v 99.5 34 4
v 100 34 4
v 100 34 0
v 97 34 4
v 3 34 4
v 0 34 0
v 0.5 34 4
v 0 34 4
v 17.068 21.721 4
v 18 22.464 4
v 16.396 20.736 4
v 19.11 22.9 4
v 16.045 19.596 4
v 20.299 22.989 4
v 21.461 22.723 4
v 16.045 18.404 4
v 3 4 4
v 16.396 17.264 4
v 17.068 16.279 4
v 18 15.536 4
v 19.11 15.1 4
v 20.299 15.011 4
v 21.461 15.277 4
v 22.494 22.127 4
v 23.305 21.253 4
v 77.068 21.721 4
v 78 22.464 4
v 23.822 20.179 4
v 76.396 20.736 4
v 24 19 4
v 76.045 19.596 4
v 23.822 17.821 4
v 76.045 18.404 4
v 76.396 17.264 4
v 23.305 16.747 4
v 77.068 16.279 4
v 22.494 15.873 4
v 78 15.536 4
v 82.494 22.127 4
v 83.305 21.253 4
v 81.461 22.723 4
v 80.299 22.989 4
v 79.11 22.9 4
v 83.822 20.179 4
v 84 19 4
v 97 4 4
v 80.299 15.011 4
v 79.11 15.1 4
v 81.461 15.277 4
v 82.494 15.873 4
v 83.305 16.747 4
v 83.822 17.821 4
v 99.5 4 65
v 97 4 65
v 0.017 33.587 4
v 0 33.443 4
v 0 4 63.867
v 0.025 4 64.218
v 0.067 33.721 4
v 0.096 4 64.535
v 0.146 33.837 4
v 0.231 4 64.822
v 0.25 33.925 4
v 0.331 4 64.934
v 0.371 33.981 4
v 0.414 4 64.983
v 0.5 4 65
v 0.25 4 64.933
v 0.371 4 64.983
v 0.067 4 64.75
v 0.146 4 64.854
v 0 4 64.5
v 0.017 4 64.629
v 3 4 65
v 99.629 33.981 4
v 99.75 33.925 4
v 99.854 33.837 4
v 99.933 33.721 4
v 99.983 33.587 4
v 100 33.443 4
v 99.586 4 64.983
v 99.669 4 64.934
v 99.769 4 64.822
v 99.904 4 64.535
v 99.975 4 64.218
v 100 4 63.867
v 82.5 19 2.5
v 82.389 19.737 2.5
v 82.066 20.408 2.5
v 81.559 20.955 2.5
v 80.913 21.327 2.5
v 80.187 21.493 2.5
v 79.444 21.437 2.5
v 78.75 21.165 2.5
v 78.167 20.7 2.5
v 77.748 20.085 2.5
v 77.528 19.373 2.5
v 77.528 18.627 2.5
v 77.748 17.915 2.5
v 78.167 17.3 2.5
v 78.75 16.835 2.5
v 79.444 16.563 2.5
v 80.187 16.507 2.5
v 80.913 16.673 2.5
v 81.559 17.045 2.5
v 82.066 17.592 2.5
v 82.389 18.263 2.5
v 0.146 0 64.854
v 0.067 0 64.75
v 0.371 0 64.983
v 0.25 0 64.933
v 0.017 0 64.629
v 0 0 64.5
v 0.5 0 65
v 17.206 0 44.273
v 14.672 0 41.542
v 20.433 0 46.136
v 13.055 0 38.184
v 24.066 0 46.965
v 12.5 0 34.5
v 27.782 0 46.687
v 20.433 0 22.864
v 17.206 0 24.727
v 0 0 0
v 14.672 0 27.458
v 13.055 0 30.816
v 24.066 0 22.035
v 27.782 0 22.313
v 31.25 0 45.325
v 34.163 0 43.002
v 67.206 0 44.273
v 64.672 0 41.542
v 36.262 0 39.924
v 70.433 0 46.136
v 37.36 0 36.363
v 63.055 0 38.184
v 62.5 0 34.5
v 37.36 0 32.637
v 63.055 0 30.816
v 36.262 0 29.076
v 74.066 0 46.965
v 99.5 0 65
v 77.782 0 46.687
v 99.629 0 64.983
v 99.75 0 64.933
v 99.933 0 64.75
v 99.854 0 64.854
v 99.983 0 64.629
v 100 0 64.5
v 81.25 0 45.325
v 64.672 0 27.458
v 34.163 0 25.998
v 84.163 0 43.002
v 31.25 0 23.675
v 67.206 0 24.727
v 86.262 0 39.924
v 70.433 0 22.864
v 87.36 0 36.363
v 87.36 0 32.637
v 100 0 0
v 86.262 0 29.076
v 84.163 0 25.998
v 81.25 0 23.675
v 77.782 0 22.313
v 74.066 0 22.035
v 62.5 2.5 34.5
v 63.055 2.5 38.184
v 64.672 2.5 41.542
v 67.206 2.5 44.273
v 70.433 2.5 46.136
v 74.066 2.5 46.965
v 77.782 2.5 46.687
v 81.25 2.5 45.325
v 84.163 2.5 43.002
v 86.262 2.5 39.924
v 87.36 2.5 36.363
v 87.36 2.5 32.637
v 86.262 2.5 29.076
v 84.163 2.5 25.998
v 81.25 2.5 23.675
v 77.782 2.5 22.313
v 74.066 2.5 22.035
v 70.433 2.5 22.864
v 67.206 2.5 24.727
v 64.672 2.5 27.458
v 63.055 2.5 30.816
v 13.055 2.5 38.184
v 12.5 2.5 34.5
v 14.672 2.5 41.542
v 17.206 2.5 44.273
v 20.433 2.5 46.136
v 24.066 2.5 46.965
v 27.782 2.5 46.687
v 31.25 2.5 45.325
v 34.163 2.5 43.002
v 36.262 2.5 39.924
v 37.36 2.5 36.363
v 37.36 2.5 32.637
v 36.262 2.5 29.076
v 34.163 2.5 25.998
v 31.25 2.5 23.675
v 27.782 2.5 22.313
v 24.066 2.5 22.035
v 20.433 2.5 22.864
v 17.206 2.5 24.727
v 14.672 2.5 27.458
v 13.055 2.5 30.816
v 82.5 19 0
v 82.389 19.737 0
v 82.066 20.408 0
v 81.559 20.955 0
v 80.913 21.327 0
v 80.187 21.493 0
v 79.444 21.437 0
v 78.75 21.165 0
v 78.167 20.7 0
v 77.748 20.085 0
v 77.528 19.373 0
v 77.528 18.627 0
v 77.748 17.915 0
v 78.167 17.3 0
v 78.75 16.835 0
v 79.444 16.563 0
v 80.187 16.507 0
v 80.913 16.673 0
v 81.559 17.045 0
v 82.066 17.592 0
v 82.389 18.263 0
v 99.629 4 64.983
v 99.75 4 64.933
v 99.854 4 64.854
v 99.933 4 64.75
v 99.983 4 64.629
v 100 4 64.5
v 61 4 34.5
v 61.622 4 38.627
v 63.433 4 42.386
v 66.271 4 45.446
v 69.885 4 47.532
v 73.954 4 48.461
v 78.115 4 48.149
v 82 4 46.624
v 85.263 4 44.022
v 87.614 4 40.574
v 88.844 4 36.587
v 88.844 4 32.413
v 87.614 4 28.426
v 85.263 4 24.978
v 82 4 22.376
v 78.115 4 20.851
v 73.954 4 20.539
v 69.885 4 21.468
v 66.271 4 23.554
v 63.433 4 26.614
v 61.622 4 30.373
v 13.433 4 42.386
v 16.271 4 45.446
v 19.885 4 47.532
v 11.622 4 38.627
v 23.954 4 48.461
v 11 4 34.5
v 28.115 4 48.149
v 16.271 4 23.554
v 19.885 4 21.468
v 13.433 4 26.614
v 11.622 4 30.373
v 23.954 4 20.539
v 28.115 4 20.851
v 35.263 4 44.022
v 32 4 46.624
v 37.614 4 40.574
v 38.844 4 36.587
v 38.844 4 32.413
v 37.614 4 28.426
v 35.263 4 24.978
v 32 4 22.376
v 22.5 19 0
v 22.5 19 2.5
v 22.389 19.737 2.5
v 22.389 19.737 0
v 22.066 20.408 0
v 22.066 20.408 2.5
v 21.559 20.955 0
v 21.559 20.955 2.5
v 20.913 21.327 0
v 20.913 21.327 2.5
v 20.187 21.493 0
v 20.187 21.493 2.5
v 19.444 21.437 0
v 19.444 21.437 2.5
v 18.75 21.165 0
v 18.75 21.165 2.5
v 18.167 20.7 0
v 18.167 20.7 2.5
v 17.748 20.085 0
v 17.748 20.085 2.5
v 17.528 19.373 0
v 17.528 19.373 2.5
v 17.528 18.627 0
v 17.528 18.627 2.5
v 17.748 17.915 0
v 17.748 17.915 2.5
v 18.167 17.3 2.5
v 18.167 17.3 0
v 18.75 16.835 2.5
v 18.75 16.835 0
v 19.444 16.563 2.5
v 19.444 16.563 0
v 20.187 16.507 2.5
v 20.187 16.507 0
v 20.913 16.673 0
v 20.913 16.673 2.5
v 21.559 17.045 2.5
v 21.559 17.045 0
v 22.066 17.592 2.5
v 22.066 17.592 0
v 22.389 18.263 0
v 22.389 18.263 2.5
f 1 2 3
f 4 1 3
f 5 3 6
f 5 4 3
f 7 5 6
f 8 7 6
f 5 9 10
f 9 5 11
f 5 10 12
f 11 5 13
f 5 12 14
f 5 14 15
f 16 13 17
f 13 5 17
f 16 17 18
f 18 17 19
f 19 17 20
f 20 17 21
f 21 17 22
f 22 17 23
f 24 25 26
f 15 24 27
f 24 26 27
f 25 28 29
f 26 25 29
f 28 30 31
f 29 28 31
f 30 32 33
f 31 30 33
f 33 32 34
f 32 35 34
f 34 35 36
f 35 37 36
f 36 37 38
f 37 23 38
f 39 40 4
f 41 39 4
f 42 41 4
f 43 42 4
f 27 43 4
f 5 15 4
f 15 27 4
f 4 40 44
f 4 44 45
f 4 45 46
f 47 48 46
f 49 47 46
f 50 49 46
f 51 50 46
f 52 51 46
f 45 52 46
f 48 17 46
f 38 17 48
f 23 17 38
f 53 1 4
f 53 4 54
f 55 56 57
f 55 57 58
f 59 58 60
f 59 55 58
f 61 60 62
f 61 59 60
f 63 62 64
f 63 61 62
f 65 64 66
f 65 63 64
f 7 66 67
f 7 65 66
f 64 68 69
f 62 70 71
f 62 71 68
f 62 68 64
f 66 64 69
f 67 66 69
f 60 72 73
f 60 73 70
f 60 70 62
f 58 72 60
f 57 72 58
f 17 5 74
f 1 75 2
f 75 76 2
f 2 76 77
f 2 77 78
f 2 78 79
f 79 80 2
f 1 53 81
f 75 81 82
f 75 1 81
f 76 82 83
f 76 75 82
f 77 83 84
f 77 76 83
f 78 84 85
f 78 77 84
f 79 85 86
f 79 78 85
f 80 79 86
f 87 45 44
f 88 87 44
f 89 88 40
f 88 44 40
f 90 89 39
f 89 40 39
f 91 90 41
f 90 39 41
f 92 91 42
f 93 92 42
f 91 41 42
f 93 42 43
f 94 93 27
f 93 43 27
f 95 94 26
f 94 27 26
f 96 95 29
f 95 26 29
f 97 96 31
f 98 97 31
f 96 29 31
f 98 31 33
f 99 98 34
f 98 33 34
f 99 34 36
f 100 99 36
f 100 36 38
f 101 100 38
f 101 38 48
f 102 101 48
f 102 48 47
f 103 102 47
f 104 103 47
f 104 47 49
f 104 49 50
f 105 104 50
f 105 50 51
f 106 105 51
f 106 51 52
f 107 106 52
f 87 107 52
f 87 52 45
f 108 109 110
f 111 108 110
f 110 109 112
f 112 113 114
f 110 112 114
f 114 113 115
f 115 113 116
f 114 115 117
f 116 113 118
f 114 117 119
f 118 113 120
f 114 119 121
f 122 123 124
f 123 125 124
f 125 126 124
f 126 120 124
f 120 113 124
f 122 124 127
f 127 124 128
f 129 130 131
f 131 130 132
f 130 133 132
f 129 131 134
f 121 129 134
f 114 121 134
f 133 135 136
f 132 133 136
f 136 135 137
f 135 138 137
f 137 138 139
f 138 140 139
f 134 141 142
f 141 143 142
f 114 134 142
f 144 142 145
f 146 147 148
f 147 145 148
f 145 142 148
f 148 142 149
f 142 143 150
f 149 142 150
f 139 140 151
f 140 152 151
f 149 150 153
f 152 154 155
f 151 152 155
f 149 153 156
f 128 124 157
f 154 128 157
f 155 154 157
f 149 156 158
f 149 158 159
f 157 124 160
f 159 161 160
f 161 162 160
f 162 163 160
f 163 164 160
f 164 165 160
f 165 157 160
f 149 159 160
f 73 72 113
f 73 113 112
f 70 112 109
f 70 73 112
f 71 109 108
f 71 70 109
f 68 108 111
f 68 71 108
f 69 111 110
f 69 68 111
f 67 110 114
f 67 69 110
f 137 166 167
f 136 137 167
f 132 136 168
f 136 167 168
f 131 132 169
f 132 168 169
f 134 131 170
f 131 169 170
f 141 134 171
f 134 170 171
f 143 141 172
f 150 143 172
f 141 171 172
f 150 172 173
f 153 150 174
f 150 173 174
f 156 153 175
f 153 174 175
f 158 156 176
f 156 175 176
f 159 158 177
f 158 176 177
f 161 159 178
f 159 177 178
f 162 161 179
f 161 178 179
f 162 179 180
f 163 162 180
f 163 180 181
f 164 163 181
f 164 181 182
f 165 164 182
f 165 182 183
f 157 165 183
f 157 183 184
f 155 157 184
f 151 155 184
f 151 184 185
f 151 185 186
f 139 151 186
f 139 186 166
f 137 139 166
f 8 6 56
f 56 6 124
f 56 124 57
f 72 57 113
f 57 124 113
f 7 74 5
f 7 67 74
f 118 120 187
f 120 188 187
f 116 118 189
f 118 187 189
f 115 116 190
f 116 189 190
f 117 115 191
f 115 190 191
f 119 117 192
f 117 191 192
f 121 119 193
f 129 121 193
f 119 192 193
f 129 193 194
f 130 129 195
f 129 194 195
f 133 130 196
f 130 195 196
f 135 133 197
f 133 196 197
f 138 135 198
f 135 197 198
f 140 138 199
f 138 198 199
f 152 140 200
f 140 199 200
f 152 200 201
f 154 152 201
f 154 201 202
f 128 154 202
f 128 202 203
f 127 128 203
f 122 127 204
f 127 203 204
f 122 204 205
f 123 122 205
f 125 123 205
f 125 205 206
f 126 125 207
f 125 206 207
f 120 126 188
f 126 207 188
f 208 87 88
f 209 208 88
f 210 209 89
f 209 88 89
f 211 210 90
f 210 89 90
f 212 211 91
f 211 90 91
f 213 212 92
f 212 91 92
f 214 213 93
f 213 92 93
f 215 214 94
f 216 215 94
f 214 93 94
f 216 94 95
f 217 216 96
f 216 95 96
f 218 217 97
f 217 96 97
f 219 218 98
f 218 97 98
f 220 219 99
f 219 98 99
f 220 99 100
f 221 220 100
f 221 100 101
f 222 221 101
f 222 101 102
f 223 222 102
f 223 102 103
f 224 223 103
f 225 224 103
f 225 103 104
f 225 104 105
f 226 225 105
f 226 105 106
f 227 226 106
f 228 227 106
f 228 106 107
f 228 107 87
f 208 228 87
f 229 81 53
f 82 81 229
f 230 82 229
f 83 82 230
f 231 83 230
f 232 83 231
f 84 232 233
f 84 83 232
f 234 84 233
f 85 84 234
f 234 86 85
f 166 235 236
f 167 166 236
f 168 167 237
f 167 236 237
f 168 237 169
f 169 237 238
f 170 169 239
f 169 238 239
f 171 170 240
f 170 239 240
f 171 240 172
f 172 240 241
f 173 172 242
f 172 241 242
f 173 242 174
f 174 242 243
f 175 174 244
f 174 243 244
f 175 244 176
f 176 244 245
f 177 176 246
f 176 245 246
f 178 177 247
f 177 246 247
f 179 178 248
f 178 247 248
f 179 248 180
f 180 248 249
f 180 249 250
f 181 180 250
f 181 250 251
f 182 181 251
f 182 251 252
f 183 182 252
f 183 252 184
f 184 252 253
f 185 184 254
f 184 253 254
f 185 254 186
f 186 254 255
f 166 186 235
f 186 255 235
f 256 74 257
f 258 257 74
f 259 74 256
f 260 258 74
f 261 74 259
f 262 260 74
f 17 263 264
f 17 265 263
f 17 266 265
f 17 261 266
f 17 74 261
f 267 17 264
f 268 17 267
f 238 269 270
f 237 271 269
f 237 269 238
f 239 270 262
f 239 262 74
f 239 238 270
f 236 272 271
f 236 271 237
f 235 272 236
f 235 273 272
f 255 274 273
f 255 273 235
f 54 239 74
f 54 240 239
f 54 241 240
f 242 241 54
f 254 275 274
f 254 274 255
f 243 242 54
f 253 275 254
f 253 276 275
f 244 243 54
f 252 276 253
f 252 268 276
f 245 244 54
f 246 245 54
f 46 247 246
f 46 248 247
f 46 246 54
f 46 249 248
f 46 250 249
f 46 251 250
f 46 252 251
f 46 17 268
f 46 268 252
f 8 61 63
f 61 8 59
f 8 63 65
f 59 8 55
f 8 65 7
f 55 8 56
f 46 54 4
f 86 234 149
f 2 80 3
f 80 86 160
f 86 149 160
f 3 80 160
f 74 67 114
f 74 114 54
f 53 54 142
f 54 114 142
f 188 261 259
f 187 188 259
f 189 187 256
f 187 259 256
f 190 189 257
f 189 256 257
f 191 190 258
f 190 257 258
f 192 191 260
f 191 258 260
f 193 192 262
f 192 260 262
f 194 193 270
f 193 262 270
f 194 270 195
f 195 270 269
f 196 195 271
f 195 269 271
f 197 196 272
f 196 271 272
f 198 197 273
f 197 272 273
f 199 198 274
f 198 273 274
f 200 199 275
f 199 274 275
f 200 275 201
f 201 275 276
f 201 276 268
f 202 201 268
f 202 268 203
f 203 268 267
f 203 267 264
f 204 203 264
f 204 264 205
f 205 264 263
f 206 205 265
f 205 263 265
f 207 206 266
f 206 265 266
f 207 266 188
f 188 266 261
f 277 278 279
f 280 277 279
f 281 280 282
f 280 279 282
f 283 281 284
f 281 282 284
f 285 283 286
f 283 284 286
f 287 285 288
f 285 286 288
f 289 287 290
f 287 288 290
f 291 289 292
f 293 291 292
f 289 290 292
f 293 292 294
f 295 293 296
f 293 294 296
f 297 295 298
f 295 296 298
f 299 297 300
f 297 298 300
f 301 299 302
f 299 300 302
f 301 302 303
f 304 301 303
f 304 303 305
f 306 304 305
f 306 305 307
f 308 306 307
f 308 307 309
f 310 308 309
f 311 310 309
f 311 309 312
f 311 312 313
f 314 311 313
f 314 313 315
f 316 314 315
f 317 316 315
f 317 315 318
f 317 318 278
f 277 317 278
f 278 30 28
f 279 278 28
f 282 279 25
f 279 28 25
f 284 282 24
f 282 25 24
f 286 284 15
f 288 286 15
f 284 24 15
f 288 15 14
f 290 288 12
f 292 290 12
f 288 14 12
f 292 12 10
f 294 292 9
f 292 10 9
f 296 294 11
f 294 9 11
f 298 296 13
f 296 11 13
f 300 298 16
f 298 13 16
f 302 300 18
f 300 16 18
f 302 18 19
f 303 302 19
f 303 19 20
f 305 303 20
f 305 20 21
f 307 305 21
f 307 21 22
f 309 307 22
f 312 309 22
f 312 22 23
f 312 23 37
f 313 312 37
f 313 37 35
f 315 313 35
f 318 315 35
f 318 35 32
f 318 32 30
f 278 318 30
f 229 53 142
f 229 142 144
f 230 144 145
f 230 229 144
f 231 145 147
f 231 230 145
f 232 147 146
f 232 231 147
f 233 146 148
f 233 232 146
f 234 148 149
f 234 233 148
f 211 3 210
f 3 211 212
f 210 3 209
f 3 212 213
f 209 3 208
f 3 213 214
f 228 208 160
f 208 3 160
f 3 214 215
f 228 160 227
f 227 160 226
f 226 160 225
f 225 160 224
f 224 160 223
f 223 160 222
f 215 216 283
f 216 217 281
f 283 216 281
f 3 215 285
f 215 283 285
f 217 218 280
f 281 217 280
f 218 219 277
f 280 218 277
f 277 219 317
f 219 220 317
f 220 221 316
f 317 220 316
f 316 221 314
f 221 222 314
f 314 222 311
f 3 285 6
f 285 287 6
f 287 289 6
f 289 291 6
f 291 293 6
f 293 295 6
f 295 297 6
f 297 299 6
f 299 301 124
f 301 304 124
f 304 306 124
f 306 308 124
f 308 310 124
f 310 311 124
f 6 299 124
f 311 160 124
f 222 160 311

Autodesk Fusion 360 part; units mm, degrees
sketch "Sketch1" plane through (0, 0, 0) normal (0, 1, 0) x (1, 0, 0)
  line L0 (0, 0) -> (0, -65)
  line L1 (0, -65) -> (100, -65)
  line L2 (100, -65) -> (100, 0)
  line L3 (100, 0) -> (0, 0)
  dimension "d1" = 65
extrude "Extrude1" add sketch "Sketch1" along normal blind 4 makes body 1
sketch "Sketch2" plane through (0, 4, 0) normal (0, 1, 0) x (-1, 0, 0)
  line L0 (-100, 0) -> (0, 0)
  line L1 (0, 0) -> (0, 65)
  line L2 (0, 65) -> (-100, 65)
  line L3 (-100, 65) -> (-100, 0)
  line L4 (0, 0) -> (-100, 0)
  line L5 (-100, 0) -> (-100, 4)
  line L6 (0, 0) -> (0, 4)
  line L7 (0, 4) -> (-100, 4)
  dimension "d4" = 4
  dimension "d5" = 4
extrude "Extrude2" add sketch "Sketch2" along normal blind 30 contours L0 L1 L3 L4 L5 L6 L7 bodies 1
sketch "Sketch4" plane through (0, 4, 0) normal (0, 1, 0) x (-1, 0, 0)
  line L0 (-100, 4) -> (0, 4)
  line L1 (0, 4) -> (0, 65)
  line L2 (0, 65) -> (-100, 65)
  line L3 (-100, 65) -> (-100, 4)
  line L4 (-50, 4) -> (-50, 65) construction
  line L5 (-50, 34.5) -> (-25, 34.5) construction
  circle A0 centre (-25, 34.5) radius 12.5
  circle A1 centre (-75, 34.5) radius 12.5
  dimension "d8" = 25
  dimension "d9" = 25
sketch "Sketch6" plane through (0, 0, 0) normal (-1, 0, 0) x (0, 0, 1)
  line L0 (0, 0) -> (65, 0)
  line L1 (65, 0) -> (65, 4)
  line L2 (65, 4) -> (4, 4)
  line L3 (4, 4) -> (4, 34)
  line L4 (4, 34) -> (0, 34)
  line L5 (0, 34) -> (0, 0)
  line L6 (4, 34) -> (4, 4)
  line L7 (65, 4) -> (4, 34)
extrude "Extrude3" add sketch "Sketch6" against normal blind 3 separate body contours L2 L3 L6 L7 makes body 2
ref_plane "WorkPlane1" through (50, 19, 34.5) normal (-1, 0, 0) x (0, 0, 1)
mirror "Mirror1" about plane through (50, 19, 34.5) normal (-1, 0, 0) of bodies 2 makes body 3
extrude "Extrude4" cut sketch "Sketch4" against normal blind 30 contours A0 | A1 bodies 1
chamfer "Chamfer1" distance 1.5 angle 45 2 edges at (86.6541, 4, 39.0202) (36.6541, 4, 39.0202) on bodies 1
sketch "Sketch7" plane through (0, 0, 4) normal (0, 0, 1) x (1, 0, 0)
  line L0 (0, 4) -> (100, 4)
  line L1 (100, 4) -> (100, 34)
  line L2 (100, 34) -> (0, 34)
  line L3 (0, 34) -> (0, 4)
  line L4 (50, 34) -> (50, 19) construction
  line L5 (50, 19) -> (20, 19)
  circle A0 centre (20, 19) radius 2.5
  circle A1 centre (80, 19) radius 2.5
  dimension "d17" = 15
  dimension "d18" = 30
  dimension "d19" = 5
extrude "Extrude5" cut sketch "Sketch7" against normal blind 29 contours A0 | A1 bodies 1
chamfer "Chamfer2" distance 1.5 angle 45 2 edges at (77.6692, 19.904, 4) (17.6692, 19.904, 4) on bodies 1
fillet "Fillet4" radius 0.5 4 edges at (0, 2, 65) (100, 2, 65) (0, 19, 34.5) (100, 19, 34.5) on bodies 1 2 3
combine "Combine1" operation add target body 1 tool bodies 2 3
